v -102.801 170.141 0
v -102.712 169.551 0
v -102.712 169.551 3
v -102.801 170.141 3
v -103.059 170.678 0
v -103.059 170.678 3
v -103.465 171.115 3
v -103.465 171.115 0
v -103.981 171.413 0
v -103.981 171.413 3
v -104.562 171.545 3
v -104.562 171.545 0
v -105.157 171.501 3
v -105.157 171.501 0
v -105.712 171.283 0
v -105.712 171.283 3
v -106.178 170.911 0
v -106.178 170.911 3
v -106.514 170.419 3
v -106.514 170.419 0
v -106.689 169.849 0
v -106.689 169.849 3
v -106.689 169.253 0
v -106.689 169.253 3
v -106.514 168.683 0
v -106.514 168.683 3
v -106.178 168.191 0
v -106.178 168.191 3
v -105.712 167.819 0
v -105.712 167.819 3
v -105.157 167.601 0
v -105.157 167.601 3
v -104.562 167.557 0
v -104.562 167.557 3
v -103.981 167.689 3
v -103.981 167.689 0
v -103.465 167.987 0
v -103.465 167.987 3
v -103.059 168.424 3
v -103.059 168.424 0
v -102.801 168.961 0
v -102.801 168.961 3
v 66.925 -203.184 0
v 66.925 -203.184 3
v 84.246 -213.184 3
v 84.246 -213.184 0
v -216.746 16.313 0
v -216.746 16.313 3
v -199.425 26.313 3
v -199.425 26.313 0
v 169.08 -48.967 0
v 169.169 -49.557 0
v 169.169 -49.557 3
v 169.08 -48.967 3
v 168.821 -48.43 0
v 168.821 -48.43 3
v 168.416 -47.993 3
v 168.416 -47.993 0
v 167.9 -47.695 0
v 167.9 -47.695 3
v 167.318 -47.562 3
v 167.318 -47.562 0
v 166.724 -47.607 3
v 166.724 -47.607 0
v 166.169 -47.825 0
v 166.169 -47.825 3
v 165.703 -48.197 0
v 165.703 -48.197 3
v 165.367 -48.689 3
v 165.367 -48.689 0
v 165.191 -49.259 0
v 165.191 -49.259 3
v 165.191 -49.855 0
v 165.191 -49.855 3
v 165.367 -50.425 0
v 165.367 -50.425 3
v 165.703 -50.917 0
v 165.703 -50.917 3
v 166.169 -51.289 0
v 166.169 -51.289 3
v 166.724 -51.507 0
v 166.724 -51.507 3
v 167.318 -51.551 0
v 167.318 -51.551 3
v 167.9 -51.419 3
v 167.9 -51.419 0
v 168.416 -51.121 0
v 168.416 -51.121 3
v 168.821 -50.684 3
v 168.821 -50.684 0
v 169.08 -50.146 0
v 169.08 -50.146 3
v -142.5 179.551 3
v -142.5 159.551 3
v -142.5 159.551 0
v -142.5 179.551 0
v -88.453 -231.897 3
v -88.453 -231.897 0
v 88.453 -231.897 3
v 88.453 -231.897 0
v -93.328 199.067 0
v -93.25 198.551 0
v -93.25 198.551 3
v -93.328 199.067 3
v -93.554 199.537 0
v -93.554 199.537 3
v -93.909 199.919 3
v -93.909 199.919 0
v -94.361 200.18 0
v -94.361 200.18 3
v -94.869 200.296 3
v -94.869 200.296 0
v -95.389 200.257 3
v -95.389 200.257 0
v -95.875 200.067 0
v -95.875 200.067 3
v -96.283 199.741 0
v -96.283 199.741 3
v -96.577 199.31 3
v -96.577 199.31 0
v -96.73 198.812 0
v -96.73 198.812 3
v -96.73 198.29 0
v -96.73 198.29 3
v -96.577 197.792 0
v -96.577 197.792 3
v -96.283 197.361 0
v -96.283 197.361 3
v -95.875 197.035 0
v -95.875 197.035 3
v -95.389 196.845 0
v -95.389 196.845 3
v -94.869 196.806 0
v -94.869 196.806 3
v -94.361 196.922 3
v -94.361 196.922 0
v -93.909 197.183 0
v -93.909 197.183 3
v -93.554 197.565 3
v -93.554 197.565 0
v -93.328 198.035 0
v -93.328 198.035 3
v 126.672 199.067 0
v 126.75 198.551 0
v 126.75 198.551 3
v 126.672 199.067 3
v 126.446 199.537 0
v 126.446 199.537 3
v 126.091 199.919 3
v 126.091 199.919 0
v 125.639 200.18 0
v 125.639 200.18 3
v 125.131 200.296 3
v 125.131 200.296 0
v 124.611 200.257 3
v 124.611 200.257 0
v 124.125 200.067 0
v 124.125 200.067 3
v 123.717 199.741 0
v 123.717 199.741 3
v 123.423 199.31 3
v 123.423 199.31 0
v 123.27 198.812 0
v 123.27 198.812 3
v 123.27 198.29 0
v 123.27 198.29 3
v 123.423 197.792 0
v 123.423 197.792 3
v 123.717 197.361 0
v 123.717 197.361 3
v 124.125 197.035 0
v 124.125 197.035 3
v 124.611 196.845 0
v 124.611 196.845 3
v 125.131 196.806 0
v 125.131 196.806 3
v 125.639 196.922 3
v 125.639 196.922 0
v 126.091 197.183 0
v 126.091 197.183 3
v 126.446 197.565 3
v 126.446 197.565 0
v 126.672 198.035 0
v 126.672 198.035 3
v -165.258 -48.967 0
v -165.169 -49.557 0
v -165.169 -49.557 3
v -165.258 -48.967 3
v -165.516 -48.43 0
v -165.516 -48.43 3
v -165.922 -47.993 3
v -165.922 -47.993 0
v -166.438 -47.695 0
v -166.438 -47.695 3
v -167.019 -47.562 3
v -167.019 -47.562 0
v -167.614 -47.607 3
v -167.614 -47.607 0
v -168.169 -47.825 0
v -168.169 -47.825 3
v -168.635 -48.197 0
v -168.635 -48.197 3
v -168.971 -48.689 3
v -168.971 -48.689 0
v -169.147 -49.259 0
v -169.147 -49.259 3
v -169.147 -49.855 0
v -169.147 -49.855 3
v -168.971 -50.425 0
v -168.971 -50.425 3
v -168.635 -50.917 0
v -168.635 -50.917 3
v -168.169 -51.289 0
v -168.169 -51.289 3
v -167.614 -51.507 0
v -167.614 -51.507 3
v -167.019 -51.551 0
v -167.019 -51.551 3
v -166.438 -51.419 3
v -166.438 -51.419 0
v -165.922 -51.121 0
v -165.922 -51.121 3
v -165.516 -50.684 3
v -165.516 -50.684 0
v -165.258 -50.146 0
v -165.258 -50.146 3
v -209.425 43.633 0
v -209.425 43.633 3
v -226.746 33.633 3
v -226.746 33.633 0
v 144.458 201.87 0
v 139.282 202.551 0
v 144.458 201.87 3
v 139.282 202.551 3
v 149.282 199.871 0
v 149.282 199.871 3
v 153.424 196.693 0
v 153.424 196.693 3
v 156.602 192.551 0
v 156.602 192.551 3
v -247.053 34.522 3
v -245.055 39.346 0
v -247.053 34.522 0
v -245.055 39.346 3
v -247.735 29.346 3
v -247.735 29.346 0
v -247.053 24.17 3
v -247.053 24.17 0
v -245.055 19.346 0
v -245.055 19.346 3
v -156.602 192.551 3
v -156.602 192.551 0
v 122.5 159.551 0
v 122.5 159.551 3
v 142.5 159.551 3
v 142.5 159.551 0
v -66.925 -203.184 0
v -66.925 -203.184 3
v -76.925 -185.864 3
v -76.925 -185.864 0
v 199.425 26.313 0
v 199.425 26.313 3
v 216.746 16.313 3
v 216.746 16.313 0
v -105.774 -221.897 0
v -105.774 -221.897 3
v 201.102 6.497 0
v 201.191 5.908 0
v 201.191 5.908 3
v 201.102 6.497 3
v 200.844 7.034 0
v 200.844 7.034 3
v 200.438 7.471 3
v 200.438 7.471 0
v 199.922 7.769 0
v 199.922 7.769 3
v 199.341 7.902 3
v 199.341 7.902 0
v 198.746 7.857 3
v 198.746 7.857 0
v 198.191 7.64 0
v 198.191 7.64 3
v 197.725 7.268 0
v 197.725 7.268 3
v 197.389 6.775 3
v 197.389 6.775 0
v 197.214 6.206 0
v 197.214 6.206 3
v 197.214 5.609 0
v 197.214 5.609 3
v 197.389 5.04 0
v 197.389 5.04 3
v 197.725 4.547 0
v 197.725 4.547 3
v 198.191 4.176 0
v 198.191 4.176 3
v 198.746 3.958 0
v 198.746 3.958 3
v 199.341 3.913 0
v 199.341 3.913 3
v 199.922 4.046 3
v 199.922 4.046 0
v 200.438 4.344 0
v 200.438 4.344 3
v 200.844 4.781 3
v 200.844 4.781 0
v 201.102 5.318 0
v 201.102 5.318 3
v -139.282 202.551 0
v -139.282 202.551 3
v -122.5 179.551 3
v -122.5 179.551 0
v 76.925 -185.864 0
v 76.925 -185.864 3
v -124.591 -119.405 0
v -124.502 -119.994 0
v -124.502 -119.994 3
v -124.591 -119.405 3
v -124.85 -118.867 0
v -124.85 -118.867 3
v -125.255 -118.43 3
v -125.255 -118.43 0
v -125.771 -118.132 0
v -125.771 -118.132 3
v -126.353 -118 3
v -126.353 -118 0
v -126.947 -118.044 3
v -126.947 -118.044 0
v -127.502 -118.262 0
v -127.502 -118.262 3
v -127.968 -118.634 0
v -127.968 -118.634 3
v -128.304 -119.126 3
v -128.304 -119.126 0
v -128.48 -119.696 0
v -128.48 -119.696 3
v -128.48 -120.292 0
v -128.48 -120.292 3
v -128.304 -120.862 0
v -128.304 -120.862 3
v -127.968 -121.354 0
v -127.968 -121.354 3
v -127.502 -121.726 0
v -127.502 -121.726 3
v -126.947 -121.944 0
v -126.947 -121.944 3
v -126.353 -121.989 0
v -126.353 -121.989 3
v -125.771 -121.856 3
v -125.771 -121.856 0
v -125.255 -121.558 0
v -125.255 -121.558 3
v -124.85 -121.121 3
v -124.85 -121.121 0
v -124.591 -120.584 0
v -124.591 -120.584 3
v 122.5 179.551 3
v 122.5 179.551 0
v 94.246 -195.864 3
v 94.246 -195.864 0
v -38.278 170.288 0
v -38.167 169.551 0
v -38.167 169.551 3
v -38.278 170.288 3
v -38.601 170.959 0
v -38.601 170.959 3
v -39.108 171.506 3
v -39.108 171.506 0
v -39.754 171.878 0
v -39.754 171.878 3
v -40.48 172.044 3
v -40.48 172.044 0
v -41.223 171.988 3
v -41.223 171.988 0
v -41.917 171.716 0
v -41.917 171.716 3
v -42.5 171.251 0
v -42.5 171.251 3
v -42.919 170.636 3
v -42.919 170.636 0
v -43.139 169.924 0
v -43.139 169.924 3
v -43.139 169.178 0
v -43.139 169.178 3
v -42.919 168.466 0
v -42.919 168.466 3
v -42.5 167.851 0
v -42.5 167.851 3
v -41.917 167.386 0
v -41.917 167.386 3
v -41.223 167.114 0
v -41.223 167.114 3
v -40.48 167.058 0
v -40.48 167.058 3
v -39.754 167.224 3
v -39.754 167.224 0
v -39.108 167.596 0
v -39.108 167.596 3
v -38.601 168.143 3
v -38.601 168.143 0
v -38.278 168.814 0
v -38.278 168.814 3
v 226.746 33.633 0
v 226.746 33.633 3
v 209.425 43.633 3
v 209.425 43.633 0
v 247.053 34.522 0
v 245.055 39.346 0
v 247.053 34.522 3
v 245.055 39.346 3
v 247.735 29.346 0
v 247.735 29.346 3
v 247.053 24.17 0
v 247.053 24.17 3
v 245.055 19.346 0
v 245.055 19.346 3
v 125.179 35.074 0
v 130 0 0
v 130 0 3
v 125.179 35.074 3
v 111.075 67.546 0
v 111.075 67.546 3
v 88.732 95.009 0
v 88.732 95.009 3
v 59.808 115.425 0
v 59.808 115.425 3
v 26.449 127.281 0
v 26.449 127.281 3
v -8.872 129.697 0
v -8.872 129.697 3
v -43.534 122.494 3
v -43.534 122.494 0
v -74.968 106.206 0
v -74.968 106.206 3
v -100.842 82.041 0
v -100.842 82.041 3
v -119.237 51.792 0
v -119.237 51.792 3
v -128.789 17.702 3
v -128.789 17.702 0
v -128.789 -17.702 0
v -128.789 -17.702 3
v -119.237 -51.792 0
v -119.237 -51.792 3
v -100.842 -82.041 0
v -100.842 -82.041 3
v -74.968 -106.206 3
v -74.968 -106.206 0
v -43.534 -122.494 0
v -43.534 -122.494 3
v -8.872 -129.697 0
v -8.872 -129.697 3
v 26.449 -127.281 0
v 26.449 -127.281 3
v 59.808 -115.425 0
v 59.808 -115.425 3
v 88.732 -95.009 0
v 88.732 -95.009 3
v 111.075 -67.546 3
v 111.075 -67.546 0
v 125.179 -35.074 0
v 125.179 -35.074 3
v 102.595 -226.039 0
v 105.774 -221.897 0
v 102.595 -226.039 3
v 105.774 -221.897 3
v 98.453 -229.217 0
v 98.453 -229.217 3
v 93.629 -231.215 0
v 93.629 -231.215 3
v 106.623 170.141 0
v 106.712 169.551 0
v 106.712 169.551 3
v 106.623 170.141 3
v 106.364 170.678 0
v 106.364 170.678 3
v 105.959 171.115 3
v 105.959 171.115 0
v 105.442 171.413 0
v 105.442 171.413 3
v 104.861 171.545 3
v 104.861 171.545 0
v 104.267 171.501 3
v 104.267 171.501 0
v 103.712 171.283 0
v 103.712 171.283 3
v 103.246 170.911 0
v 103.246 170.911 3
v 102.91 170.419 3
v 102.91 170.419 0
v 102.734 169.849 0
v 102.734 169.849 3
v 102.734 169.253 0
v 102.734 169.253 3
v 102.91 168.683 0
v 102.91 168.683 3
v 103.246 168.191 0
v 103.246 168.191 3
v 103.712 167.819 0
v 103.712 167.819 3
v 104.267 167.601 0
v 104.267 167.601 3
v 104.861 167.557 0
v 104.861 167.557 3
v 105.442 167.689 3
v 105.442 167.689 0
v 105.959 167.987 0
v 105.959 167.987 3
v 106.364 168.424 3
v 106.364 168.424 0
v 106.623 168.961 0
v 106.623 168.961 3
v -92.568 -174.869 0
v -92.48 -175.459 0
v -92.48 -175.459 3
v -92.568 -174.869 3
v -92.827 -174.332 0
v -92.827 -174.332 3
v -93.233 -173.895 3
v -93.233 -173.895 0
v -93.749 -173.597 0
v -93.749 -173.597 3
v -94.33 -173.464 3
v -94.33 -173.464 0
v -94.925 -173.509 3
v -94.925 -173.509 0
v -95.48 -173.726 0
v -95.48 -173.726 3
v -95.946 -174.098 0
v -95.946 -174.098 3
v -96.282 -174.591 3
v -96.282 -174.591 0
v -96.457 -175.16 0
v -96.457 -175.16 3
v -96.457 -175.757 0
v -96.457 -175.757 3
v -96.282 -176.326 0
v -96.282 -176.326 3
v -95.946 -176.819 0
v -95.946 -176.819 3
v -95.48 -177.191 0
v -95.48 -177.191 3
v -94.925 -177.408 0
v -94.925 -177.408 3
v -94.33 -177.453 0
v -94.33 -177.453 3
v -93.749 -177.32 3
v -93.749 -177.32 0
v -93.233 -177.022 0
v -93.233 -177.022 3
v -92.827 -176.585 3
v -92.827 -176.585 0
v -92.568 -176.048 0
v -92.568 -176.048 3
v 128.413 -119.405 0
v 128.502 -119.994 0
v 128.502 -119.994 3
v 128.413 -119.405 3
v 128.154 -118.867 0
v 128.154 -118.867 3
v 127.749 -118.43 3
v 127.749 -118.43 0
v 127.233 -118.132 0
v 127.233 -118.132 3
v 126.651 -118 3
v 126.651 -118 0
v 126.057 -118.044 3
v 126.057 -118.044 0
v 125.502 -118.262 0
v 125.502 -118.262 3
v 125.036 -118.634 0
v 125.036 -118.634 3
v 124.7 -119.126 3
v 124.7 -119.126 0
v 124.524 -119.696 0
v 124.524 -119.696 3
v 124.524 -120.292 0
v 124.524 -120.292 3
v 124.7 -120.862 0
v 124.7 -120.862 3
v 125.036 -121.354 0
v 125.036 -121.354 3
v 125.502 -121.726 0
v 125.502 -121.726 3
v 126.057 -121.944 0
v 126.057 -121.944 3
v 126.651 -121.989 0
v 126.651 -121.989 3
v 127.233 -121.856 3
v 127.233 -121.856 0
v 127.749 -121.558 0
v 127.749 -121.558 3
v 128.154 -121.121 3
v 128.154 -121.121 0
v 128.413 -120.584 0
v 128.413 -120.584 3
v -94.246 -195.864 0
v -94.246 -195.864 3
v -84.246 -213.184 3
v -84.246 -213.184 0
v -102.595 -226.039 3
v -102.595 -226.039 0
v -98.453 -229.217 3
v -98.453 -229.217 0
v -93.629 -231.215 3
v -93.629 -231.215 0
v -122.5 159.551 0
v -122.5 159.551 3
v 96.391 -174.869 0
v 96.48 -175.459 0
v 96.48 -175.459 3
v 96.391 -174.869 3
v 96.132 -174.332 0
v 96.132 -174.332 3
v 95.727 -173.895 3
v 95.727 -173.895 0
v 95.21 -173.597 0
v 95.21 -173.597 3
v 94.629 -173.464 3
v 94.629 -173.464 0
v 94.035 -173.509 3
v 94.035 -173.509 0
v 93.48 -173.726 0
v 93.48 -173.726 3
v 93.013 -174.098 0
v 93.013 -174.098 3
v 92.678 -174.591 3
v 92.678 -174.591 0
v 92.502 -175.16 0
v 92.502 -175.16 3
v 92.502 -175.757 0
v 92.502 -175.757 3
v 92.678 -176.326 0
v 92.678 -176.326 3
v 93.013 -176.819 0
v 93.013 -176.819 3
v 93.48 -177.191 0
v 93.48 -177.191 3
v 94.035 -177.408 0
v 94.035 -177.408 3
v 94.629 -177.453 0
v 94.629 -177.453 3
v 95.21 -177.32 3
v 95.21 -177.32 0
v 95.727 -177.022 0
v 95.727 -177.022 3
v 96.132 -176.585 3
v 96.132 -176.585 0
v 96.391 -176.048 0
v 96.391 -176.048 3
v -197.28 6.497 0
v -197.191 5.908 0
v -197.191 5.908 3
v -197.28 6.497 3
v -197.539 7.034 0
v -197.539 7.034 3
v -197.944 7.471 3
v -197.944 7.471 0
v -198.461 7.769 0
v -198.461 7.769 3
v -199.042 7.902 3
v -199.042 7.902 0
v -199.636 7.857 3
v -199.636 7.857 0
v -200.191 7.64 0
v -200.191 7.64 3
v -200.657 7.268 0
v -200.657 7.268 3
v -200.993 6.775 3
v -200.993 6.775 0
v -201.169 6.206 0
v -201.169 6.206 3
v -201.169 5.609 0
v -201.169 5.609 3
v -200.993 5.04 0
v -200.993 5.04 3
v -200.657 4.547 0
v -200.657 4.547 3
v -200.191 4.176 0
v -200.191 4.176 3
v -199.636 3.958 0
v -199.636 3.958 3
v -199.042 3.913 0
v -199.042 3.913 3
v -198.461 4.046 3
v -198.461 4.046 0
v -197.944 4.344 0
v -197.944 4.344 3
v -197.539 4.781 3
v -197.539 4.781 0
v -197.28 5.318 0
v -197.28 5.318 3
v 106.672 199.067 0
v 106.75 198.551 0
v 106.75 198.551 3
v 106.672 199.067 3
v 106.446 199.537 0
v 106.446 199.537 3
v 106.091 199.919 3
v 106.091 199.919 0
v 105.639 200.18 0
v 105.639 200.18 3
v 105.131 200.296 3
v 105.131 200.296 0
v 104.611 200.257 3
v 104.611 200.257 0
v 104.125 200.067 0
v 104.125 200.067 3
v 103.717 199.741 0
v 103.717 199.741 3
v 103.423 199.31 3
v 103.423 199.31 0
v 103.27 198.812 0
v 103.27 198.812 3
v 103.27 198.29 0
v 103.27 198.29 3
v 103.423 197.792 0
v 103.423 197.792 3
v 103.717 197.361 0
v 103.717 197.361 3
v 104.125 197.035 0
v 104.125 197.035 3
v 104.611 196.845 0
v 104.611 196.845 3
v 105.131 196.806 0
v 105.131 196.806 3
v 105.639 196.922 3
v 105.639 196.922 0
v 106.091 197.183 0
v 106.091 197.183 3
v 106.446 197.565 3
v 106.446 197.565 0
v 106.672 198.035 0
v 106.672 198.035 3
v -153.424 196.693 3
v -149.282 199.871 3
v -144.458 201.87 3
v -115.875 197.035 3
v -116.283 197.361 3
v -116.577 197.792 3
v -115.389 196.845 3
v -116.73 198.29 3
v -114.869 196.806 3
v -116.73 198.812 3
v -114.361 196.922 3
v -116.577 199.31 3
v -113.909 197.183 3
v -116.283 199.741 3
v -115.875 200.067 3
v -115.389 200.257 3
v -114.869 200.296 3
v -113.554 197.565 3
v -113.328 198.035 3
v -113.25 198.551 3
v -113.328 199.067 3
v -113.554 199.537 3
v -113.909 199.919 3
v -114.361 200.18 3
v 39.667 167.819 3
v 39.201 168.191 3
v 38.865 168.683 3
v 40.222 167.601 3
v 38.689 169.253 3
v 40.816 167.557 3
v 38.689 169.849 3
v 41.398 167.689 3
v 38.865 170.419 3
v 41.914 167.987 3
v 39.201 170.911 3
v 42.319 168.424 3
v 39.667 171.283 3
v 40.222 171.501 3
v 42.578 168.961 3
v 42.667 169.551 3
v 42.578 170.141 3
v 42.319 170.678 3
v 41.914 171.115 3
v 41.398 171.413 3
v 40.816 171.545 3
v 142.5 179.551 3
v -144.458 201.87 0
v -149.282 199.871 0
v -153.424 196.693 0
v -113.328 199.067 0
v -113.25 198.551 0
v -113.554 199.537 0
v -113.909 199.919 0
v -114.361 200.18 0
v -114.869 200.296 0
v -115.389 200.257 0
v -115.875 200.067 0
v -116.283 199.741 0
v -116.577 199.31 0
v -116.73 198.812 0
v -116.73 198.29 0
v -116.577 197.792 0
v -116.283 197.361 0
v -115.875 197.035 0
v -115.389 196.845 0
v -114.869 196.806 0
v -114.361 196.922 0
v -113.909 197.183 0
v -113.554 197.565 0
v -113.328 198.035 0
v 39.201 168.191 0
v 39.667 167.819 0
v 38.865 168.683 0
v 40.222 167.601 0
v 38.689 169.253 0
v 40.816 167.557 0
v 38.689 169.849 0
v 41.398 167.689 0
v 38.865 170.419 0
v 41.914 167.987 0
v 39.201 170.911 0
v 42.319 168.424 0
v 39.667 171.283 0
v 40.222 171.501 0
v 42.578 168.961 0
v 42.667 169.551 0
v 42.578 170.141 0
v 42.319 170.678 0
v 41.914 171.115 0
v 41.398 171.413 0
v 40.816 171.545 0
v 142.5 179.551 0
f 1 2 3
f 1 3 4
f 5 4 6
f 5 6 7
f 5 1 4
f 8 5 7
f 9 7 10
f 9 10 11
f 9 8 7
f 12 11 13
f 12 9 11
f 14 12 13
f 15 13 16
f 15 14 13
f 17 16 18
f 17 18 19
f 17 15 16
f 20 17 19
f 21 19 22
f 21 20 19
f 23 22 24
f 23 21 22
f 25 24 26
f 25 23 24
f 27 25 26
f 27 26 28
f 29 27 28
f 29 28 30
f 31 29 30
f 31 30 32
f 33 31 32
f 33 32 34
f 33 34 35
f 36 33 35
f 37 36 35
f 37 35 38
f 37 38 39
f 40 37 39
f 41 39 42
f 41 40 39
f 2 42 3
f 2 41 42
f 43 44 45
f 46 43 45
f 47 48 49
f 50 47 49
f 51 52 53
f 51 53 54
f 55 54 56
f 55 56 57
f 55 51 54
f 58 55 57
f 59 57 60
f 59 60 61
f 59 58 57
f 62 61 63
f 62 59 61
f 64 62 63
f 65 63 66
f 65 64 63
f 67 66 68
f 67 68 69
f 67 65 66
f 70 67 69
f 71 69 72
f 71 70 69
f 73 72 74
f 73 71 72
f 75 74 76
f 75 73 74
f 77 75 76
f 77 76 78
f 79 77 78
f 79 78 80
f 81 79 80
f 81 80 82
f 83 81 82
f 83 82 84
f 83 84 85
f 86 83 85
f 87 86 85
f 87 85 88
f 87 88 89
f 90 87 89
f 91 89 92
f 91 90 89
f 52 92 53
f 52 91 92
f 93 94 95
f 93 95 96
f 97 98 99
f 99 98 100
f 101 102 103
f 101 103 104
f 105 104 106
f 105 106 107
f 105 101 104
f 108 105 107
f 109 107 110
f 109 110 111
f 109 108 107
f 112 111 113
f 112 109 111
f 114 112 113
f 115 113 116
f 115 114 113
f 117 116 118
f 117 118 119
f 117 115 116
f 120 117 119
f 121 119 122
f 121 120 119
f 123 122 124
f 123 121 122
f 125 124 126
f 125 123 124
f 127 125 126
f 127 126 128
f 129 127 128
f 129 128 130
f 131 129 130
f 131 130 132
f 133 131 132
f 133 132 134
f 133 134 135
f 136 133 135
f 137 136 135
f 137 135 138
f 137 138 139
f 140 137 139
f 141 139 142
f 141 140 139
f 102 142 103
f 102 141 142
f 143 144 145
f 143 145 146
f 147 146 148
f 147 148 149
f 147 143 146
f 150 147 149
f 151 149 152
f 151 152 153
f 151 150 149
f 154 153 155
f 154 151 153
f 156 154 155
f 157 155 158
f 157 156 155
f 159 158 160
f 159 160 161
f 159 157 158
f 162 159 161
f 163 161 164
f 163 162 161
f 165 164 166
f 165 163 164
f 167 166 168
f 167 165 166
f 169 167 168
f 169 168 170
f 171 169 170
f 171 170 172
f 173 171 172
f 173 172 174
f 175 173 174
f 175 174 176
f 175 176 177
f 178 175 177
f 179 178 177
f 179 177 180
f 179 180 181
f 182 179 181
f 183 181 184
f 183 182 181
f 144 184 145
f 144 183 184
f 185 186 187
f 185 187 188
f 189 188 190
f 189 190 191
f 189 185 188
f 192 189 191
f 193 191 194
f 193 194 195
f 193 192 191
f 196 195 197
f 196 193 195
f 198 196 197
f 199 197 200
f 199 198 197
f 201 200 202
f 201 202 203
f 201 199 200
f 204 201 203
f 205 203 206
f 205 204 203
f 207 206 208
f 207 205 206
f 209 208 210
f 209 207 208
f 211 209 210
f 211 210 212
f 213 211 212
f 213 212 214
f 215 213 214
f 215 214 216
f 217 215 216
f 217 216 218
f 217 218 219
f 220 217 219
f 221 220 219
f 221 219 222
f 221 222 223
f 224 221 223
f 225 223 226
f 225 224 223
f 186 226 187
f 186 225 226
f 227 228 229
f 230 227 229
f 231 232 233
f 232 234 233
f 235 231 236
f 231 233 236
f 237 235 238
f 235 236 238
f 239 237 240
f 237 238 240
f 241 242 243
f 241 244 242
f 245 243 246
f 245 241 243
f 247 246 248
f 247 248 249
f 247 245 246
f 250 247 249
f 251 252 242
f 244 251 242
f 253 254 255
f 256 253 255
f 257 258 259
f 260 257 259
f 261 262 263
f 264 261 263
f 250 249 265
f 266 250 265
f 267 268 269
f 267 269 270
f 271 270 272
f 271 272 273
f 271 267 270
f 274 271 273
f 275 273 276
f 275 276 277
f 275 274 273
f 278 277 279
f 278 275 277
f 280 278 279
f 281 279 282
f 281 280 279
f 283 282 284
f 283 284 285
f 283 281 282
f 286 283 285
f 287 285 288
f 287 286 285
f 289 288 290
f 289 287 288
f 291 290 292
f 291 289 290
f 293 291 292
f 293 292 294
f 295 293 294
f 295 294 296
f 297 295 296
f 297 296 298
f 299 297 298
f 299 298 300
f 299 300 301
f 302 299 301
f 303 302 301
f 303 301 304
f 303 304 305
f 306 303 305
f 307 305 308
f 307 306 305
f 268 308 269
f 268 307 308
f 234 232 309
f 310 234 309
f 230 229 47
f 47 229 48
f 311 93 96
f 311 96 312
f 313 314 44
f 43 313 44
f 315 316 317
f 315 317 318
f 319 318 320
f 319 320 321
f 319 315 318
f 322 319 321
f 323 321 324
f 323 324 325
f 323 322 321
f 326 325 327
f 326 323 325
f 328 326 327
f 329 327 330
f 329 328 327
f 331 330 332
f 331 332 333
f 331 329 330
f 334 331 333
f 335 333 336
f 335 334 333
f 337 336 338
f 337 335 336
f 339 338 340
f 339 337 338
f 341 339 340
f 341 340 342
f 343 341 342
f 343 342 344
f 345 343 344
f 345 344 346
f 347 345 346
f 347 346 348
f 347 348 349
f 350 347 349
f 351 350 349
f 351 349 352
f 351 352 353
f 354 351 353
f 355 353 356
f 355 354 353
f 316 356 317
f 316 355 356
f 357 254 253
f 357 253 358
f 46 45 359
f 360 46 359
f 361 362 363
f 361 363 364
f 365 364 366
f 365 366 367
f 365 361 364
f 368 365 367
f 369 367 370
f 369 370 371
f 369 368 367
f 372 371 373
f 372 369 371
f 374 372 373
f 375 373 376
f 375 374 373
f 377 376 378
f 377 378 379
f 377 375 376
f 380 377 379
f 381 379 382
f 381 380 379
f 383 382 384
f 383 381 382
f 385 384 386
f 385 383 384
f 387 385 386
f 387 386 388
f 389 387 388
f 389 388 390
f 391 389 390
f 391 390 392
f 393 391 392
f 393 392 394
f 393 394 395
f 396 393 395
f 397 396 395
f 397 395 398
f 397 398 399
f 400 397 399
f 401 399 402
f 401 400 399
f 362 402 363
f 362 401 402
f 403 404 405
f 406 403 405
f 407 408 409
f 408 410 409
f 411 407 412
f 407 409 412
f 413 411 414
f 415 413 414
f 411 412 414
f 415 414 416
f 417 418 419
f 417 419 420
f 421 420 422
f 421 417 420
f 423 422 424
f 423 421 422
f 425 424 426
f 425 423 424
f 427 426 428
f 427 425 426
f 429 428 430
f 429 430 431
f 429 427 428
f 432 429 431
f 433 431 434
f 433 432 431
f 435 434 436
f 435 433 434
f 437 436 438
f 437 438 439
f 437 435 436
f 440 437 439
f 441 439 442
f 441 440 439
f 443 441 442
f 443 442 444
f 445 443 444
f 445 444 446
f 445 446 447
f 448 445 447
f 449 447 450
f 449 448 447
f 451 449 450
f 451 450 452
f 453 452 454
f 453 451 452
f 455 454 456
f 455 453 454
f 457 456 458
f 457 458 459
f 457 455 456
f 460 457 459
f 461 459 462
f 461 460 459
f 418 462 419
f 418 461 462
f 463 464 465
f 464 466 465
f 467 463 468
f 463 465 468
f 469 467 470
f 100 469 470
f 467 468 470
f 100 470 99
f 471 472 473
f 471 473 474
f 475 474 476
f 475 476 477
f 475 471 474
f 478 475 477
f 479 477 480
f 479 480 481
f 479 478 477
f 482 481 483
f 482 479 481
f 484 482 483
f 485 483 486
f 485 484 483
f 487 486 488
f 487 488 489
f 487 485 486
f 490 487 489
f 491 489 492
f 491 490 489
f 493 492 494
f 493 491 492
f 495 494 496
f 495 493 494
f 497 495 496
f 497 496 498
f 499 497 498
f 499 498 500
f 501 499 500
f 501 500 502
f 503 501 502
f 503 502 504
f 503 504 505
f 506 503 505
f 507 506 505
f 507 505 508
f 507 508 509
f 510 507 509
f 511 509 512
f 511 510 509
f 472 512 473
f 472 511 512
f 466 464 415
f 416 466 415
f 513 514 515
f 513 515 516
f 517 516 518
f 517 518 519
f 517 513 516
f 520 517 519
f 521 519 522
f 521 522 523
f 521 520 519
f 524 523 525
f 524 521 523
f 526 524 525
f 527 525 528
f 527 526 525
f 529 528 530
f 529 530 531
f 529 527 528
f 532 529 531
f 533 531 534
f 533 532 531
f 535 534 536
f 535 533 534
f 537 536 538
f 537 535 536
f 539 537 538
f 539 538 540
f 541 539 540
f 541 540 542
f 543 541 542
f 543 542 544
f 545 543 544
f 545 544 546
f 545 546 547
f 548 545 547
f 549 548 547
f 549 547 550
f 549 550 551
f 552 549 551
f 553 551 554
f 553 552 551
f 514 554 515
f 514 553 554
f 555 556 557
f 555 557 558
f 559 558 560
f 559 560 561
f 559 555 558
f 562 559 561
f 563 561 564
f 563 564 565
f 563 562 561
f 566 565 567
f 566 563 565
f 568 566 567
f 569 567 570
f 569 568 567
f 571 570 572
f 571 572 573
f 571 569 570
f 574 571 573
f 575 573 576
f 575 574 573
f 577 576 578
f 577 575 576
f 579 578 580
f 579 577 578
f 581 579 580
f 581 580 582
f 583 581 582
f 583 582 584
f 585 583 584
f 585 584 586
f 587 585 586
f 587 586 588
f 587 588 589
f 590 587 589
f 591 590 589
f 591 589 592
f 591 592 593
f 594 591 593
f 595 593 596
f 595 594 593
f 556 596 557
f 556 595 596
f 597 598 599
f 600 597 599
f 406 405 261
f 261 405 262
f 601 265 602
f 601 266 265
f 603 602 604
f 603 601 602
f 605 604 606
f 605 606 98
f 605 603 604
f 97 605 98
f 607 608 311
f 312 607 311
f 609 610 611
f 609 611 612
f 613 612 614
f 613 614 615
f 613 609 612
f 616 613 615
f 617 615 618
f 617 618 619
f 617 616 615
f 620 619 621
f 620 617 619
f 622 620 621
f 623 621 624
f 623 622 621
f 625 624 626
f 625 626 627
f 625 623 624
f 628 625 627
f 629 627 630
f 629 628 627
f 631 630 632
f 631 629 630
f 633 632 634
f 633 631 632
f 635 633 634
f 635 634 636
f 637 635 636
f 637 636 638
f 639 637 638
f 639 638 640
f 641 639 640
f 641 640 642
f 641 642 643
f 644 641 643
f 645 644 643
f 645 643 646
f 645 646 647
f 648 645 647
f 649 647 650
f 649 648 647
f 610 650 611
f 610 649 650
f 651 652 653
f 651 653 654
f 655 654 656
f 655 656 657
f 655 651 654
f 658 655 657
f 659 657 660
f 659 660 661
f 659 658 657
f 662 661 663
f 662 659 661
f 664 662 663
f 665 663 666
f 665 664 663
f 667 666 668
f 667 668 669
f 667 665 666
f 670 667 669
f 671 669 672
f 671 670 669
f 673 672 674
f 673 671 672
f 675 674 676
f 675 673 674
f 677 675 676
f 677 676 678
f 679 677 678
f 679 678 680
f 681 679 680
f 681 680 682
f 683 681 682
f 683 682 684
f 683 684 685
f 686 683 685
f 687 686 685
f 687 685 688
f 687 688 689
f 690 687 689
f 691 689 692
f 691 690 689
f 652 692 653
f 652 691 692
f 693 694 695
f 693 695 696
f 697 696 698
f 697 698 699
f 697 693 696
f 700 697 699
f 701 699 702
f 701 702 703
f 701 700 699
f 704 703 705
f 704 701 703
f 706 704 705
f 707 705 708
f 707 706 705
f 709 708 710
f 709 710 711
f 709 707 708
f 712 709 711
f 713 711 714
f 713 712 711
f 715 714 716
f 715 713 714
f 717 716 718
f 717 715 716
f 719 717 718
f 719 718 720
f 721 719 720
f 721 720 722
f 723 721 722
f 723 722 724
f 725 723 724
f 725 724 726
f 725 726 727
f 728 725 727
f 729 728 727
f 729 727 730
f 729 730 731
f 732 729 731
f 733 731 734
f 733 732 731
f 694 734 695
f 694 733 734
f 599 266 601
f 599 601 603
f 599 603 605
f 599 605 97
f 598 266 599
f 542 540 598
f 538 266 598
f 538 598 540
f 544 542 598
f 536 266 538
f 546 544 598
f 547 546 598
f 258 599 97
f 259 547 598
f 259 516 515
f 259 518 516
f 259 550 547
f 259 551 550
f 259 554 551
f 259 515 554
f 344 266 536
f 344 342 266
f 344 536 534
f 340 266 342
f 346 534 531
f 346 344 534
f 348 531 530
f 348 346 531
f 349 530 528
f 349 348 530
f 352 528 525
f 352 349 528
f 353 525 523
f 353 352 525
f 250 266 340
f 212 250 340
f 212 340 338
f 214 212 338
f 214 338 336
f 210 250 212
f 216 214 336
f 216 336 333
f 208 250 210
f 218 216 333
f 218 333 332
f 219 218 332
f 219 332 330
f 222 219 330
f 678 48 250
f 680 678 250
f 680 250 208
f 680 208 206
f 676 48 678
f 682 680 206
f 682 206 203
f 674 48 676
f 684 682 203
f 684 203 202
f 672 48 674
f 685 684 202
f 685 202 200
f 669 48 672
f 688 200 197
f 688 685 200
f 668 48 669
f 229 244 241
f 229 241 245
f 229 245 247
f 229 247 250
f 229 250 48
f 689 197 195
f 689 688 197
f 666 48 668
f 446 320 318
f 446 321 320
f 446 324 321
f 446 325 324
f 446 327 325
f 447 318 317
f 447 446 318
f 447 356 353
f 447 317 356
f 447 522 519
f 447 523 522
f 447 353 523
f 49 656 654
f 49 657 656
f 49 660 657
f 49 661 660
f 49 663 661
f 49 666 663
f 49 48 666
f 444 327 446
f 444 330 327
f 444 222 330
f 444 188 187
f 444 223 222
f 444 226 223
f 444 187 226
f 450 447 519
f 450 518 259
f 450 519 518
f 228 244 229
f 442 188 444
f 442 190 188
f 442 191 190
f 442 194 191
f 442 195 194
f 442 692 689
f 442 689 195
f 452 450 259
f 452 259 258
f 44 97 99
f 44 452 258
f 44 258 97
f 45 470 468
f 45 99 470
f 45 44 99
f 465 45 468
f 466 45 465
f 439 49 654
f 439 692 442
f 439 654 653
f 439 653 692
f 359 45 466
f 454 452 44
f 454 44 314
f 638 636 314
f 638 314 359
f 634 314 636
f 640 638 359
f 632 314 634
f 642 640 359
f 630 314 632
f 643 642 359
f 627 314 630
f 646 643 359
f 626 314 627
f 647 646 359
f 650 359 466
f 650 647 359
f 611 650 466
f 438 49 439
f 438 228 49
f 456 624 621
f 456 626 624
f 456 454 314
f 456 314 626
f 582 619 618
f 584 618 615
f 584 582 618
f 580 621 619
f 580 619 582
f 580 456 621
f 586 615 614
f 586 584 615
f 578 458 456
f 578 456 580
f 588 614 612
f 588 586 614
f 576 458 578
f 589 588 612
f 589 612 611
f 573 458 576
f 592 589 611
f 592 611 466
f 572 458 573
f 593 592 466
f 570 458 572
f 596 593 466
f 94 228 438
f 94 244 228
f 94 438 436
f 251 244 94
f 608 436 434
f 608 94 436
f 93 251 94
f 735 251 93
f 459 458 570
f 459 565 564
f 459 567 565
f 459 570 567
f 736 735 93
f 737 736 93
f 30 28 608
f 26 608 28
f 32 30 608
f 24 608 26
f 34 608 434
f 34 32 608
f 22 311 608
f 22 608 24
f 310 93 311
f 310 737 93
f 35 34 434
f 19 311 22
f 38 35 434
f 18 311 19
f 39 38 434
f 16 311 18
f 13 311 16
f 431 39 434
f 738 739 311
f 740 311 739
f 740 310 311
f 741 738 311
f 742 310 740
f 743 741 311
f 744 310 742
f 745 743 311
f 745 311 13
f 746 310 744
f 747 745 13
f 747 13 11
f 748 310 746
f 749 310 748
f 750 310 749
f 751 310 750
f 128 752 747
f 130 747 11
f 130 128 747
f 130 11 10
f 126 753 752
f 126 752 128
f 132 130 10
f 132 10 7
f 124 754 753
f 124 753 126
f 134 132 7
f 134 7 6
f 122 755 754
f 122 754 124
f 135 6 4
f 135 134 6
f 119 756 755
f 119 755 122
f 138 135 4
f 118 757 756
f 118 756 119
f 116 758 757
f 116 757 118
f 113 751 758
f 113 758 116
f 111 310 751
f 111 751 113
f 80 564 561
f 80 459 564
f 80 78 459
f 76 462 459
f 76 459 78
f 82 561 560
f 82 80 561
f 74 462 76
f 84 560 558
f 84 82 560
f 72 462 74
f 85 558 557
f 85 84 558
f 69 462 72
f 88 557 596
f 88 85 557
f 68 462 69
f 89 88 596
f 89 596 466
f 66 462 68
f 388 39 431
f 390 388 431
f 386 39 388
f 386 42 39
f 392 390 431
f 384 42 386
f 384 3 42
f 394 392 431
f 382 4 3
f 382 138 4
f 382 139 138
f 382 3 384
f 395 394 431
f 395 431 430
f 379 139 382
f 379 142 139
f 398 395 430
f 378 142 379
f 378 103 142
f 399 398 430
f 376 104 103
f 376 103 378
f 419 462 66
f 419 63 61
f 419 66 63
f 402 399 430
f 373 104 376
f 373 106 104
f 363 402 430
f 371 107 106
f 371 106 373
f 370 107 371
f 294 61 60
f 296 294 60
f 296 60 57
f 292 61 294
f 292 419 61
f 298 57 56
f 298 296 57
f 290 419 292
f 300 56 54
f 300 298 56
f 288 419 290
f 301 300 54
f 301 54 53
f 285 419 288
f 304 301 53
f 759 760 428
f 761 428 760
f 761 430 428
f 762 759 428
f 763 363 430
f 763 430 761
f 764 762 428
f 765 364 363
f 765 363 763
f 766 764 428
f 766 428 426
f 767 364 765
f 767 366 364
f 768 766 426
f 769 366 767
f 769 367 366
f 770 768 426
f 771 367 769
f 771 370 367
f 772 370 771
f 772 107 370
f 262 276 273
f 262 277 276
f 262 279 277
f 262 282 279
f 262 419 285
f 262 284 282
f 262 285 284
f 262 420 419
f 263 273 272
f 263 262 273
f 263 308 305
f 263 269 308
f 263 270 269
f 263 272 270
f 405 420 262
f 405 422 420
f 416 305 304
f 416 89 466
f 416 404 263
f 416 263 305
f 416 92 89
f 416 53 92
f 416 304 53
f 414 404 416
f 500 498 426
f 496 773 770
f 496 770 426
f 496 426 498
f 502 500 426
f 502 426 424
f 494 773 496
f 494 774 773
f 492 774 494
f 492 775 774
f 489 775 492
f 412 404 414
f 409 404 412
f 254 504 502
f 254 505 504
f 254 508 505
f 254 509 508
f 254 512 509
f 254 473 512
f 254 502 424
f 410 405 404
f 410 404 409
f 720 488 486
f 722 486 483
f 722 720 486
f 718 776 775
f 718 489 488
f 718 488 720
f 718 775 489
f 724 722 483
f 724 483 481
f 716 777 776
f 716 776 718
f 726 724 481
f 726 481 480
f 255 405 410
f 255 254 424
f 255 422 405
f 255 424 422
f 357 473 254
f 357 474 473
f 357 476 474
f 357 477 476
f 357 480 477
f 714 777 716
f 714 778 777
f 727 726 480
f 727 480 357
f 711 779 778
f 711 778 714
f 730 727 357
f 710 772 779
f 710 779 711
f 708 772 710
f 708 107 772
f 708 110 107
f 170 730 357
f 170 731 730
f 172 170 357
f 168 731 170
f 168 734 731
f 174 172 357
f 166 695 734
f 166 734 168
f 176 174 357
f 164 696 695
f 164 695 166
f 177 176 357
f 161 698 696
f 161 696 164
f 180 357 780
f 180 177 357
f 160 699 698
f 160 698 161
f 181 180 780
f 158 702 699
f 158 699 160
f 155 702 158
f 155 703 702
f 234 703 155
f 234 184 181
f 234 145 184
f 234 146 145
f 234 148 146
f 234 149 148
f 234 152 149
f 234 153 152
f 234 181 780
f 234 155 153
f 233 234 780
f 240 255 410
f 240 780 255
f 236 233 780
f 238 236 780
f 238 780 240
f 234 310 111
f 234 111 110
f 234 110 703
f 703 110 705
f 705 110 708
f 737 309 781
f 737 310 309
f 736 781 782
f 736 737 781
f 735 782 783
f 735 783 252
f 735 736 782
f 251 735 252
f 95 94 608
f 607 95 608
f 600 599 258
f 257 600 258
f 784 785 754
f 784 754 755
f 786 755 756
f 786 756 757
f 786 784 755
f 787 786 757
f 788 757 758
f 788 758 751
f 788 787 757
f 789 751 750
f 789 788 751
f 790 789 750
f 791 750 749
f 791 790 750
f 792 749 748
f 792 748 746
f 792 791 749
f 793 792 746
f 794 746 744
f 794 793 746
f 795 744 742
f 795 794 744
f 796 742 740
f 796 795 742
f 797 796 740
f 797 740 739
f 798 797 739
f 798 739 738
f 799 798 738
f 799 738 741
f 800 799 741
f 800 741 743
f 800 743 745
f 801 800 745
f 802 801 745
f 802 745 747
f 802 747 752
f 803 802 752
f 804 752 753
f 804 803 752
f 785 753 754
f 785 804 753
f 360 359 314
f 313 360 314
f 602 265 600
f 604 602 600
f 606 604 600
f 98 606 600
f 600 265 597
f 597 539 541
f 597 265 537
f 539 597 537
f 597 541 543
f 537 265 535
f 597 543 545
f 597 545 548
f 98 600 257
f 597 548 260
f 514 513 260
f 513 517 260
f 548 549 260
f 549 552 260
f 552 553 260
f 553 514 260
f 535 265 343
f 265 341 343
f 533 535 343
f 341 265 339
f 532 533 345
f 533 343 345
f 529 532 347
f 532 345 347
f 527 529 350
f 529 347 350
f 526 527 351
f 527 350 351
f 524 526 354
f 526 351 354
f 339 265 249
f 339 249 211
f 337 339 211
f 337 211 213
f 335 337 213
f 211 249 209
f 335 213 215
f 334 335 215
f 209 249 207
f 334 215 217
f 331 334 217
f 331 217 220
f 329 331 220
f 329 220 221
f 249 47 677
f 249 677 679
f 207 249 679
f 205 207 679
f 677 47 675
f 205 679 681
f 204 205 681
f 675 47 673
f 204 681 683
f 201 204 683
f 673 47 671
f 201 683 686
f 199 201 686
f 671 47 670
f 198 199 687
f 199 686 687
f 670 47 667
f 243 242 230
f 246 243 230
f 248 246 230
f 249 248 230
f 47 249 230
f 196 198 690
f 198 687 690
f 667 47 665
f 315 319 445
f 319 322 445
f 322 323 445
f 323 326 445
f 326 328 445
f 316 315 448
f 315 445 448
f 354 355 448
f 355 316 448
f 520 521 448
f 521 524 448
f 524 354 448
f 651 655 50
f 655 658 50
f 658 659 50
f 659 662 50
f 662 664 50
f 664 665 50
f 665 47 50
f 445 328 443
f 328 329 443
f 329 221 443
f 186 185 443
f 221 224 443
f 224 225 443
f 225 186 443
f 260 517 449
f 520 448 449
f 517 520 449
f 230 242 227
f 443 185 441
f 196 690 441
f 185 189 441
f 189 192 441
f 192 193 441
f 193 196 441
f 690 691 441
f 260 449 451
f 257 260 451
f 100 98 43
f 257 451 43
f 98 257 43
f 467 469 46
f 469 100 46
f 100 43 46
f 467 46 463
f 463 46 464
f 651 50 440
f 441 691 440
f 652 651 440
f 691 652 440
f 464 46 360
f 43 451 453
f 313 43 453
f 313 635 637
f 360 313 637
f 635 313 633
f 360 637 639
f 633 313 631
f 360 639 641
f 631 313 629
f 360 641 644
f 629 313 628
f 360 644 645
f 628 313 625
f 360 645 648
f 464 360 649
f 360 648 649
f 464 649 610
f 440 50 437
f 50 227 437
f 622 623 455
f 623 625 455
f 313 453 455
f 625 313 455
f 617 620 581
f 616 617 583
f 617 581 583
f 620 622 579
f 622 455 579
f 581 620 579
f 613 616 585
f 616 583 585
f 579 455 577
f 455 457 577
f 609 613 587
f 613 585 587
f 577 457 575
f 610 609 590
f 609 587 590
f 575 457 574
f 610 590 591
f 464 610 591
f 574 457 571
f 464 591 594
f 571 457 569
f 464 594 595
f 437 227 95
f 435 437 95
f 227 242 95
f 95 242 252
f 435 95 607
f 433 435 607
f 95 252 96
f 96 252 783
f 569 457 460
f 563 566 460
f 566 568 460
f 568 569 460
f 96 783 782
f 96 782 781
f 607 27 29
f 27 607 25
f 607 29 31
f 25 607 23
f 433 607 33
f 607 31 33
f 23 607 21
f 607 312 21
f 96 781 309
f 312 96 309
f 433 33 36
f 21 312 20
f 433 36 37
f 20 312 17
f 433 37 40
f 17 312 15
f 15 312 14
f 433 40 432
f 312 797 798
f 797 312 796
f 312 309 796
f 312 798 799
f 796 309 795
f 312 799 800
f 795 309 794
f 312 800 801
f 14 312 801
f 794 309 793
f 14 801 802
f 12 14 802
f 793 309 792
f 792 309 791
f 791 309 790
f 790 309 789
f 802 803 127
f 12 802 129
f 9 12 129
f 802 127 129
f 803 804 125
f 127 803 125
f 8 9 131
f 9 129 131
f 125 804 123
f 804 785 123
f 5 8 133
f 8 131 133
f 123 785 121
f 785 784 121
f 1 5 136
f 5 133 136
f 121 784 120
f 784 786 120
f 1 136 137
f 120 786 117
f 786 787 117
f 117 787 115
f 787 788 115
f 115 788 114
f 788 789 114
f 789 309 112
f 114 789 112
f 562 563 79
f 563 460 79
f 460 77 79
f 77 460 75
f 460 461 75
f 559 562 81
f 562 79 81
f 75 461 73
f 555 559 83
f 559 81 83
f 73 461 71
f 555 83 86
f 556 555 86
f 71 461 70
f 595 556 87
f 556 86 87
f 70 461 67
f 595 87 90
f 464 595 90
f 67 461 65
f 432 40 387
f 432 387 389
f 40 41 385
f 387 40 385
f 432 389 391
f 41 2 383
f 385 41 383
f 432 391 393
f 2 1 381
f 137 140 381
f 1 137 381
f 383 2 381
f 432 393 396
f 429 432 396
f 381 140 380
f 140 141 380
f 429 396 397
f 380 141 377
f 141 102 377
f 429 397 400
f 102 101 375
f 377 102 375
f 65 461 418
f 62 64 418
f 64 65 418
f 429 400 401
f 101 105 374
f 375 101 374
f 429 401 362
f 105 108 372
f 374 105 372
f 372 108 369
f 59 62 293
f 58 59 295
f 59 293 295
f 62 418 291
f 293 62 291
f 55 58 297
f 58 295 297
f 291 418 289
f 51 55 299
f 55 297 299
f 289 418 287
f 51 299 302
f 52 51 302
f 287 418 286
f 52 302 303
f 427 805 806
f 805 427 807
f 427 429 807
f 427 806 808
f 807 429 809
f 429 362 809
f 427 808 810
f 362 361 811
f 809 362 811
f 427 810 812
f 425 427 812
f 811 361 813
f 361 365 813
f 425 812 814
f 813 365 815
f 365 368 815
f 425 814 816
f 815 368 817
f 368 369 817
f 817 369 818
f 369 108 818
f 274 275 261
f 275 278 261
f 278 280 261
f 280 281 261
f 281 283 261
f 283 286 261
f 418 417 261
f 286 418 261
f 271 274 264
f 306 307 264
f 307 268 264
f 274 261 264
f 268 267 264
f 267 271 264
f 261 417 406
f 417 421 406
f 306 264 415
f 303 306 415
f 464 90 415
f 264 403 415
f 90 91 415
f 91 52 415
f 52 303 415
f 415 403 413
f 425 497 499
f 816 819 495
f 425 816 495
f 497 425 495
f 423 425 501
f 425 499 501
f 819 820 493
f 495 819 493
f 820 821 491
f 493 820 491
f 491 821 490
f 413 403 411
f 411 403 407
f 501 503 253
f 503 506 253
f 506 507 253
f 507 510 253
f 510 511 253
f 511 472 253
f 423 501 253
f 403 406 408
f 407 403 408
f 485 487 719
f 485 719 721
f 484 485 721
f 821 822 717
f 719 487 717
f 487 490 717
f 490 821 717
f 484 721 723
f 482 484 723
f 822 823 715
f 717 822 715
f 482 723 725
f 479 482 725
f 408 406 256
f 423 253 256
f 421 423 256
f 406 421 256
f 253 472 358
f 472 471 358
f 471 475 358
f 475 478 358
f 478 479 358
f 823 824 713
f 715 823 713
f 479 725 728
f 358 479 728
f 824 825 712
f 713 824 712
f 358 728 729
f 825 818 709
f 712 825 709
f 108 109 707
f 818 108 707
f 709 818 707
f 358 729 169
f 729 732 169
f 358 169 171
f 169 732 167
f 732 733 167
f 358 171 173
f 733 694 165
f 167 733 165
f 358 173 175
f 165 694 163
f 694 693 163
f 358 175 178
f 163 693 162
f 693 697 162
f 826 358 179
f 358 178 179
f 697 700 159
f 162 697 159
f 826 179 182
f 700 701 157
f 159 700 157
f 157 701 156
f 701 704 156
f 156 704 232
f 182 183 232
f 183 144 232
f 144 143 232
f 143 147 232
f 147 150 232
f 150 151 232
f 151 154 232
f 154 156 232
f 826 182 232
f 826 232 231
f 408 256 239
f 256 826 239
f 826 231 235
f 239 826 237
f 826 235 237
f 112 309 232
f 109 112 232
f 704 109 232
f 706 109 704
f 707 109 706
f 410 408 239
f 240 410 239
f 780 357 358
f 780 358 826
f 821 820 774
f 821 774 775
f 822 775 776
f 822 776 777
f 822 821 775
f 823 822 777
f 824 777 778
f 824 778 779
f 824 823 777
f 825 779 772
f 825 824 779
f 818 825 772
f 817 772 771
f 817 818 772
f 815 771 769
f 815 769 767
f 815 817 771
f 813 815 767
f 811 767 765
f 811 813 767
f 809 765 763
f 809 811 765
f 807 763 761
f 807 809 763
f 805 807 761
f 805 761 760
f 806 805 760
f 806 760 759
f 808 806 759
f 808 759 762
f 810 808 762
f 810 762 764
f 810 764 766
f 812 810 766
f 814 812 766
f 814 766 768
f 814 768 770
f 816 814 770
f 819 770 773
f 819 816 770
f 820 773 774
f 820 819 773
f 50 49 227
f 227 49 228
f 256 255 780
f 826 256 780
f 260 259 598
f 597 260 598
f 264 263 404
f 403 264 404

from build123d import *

# Parameters (mm, degrees)
SKETCH_1_R          = 130
SKETCH_1_R_2        = 2
SKETCH_1_R_3        = 2.5
SKETCH_1_R_4        = 1.75
EXTRUDE_1_DEPTH     = 3
SKETCH_8_W          = 20
SKETCH_8_H          = 20
CUT_EXTRUDE_4_DEPTH = 4
FILLET_2_R          = 20


with BuildPart() as part:
    # 草图1 → 凸台-拉伸1 (new body)
    with BuildSketch(Plane.XY):
        Polygon((150.828607906, 202.550991214), (-150.828607906, 202.550991214), (-250.828607906, 29.345910457), (-100, -231.89690167), (100, -231.89690167), (250.828607906, 29.345910457), align=None)
        Circle(SKETCH_1_R, mode=Mode.SUBTRACT)
        with Locations((-199.191349288, 5.907554968)):
            Circle(SKETCH_1_R_2, mode=Mode.SUBTRACT)
        with Locations((-167.168935942, -49.556891928)):
            Circle(SKETCH_1_R_2, mode=Mode.SUBTRACT)
        with Locations((-126.501995314, -119.994099285)):
            Circle(SKETCH_1_R_2, mode=Mode.SUBTRACT)
        with Locations((-94.479581967, -175.458546182)):
            Circle(SKETCH_1_R_2, mode=Mode.SUBTRACT)
        with Locations((199.191349288, 5.907554968)):
            Circle(SKETCH_1_R_2, mode=Mode.SUBTRACT)
        with Locations((167.168935942, -49.556891928)):
            Circle(SKETCH_1_R_2, mode=Mode.SUBTRACT)
        with Locations((126.501995313, -119.994099286)):
            Circle(SKETCH_1_R_2, mode=Mode.SUBTRACT)
        with Locations((94.479581967, -175.458546182)):
            Circle(SKETCH_1_R_2, mode=Mode.SUBTRACT)
        with Locations((104.711767321, 169.550991214)):
            Circle(SKETCH_1_R_2, mode=Mode.SUBTRACT)
        with Locations((40.666940629, 169.550991214)):
            Circle(SKETCH_1_R_2, mode=Mode.SUBTRACT)
        with Locations((-40.666940629, 169.550991214)):
            Circle(SKETCH_1_R_3, mode=Mode.SUBTRACT)
        with Locations((-104.711767321, 169.550991214)):
            Circle(SKETCH_1_R_2, mode=Mode.SUBTRACT)
        with Locations((125, 198.550991214)):
            Circle(SKETCH_1_R_4, mode=Mode.SUBTRACT)
        with Locations((105, 198.550991214)):
            Circle(SKETCH_1_R_4, mode=Mode.SUBTRACT)
        with Locations((-95, 198.550991214)):
            Circle(SKETCH_1_R_4, mode=Mode.SUBTRACT)
        with Locations((-115, 198.550991214)):
            Circle(SKETCH_1_R_4, mode=Mode.SUBTRACT)
    extrude(amount=EXTRUDE_1_DEPTH)

    # 草图8 → 切除-拉伸4 (cut, through all)
    with BuildSketch(Plane.XY.offset(3)):
        with Locations((-132.5, 169.550991214)):
            Rectangle(SKETCH_8_W, SKETCH_8_H)
        Polygon((-209.42521159, 43.633124432), (-226.745719666, 33.633124432), (-216.745719666, 16.312616357), (-199.42521159, 26.312616357), align=None)
        Polygon((-84.245719666, -213.184115646), (-66.92521159, -203.184115646), (-76.92521159, -185.86360757), (-94.245719666, -195.86360757), align=None)
        Polygon((66.92521159, -203.184115646), (84.245719666, -213.184115646), (94.245719666, -195.86360757), (76.92521159, -185.86360757), align=None)
        Polygon((209.42521159, 43.633124432), (199.42521159, 26.312616357), (216.745719666, 16.312616357), (226.745719666, 33.633124432), align=None)
        with Locations((132.5, 169.550991214)):
            Rectangle(SKETCH_8_W, SKETCH_8_H)
    extrude(amount=-CUT_EXTRUDE_4_DEPTH, mode=Mode.SUBTRACT)

    # 圆角2
    fillet_2_edges = [part.edges().sort_by_distance(p)[0] for p in [
        (-150.828607906, 202.550991214, 1.5),
        (150.828607906, 202.550991214, 1.5),
        (250.828607906, 29.345910457, 1.5),
        (100, -231.89690167, 1.5),
        (-100, -231.89690167, 1.5),
        (-250.828607906, 29.345910457, 1.5),
    ]]
    fillet(fillet_2_edges, radius=FILLET_2_R)


solid = part.part
